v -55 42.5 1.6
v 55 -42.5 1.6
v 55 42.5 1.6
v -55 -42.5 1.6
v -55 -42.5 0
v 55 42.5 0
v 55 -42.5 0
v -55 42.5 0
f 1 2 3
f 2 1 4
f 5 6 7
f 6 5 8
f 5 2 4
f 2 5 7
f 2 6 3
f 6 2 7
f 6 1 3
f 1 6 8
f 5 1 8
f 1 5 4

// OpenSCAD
$fn = 64;

board_x = 110.0;
board_y = 85.0;
board_th = 1.6;

color([0.05, 0.45, 0.18])
translate([-board_x/2, -board_y/2, 0])
cube([board_x, board_y, board_th], center=false);
